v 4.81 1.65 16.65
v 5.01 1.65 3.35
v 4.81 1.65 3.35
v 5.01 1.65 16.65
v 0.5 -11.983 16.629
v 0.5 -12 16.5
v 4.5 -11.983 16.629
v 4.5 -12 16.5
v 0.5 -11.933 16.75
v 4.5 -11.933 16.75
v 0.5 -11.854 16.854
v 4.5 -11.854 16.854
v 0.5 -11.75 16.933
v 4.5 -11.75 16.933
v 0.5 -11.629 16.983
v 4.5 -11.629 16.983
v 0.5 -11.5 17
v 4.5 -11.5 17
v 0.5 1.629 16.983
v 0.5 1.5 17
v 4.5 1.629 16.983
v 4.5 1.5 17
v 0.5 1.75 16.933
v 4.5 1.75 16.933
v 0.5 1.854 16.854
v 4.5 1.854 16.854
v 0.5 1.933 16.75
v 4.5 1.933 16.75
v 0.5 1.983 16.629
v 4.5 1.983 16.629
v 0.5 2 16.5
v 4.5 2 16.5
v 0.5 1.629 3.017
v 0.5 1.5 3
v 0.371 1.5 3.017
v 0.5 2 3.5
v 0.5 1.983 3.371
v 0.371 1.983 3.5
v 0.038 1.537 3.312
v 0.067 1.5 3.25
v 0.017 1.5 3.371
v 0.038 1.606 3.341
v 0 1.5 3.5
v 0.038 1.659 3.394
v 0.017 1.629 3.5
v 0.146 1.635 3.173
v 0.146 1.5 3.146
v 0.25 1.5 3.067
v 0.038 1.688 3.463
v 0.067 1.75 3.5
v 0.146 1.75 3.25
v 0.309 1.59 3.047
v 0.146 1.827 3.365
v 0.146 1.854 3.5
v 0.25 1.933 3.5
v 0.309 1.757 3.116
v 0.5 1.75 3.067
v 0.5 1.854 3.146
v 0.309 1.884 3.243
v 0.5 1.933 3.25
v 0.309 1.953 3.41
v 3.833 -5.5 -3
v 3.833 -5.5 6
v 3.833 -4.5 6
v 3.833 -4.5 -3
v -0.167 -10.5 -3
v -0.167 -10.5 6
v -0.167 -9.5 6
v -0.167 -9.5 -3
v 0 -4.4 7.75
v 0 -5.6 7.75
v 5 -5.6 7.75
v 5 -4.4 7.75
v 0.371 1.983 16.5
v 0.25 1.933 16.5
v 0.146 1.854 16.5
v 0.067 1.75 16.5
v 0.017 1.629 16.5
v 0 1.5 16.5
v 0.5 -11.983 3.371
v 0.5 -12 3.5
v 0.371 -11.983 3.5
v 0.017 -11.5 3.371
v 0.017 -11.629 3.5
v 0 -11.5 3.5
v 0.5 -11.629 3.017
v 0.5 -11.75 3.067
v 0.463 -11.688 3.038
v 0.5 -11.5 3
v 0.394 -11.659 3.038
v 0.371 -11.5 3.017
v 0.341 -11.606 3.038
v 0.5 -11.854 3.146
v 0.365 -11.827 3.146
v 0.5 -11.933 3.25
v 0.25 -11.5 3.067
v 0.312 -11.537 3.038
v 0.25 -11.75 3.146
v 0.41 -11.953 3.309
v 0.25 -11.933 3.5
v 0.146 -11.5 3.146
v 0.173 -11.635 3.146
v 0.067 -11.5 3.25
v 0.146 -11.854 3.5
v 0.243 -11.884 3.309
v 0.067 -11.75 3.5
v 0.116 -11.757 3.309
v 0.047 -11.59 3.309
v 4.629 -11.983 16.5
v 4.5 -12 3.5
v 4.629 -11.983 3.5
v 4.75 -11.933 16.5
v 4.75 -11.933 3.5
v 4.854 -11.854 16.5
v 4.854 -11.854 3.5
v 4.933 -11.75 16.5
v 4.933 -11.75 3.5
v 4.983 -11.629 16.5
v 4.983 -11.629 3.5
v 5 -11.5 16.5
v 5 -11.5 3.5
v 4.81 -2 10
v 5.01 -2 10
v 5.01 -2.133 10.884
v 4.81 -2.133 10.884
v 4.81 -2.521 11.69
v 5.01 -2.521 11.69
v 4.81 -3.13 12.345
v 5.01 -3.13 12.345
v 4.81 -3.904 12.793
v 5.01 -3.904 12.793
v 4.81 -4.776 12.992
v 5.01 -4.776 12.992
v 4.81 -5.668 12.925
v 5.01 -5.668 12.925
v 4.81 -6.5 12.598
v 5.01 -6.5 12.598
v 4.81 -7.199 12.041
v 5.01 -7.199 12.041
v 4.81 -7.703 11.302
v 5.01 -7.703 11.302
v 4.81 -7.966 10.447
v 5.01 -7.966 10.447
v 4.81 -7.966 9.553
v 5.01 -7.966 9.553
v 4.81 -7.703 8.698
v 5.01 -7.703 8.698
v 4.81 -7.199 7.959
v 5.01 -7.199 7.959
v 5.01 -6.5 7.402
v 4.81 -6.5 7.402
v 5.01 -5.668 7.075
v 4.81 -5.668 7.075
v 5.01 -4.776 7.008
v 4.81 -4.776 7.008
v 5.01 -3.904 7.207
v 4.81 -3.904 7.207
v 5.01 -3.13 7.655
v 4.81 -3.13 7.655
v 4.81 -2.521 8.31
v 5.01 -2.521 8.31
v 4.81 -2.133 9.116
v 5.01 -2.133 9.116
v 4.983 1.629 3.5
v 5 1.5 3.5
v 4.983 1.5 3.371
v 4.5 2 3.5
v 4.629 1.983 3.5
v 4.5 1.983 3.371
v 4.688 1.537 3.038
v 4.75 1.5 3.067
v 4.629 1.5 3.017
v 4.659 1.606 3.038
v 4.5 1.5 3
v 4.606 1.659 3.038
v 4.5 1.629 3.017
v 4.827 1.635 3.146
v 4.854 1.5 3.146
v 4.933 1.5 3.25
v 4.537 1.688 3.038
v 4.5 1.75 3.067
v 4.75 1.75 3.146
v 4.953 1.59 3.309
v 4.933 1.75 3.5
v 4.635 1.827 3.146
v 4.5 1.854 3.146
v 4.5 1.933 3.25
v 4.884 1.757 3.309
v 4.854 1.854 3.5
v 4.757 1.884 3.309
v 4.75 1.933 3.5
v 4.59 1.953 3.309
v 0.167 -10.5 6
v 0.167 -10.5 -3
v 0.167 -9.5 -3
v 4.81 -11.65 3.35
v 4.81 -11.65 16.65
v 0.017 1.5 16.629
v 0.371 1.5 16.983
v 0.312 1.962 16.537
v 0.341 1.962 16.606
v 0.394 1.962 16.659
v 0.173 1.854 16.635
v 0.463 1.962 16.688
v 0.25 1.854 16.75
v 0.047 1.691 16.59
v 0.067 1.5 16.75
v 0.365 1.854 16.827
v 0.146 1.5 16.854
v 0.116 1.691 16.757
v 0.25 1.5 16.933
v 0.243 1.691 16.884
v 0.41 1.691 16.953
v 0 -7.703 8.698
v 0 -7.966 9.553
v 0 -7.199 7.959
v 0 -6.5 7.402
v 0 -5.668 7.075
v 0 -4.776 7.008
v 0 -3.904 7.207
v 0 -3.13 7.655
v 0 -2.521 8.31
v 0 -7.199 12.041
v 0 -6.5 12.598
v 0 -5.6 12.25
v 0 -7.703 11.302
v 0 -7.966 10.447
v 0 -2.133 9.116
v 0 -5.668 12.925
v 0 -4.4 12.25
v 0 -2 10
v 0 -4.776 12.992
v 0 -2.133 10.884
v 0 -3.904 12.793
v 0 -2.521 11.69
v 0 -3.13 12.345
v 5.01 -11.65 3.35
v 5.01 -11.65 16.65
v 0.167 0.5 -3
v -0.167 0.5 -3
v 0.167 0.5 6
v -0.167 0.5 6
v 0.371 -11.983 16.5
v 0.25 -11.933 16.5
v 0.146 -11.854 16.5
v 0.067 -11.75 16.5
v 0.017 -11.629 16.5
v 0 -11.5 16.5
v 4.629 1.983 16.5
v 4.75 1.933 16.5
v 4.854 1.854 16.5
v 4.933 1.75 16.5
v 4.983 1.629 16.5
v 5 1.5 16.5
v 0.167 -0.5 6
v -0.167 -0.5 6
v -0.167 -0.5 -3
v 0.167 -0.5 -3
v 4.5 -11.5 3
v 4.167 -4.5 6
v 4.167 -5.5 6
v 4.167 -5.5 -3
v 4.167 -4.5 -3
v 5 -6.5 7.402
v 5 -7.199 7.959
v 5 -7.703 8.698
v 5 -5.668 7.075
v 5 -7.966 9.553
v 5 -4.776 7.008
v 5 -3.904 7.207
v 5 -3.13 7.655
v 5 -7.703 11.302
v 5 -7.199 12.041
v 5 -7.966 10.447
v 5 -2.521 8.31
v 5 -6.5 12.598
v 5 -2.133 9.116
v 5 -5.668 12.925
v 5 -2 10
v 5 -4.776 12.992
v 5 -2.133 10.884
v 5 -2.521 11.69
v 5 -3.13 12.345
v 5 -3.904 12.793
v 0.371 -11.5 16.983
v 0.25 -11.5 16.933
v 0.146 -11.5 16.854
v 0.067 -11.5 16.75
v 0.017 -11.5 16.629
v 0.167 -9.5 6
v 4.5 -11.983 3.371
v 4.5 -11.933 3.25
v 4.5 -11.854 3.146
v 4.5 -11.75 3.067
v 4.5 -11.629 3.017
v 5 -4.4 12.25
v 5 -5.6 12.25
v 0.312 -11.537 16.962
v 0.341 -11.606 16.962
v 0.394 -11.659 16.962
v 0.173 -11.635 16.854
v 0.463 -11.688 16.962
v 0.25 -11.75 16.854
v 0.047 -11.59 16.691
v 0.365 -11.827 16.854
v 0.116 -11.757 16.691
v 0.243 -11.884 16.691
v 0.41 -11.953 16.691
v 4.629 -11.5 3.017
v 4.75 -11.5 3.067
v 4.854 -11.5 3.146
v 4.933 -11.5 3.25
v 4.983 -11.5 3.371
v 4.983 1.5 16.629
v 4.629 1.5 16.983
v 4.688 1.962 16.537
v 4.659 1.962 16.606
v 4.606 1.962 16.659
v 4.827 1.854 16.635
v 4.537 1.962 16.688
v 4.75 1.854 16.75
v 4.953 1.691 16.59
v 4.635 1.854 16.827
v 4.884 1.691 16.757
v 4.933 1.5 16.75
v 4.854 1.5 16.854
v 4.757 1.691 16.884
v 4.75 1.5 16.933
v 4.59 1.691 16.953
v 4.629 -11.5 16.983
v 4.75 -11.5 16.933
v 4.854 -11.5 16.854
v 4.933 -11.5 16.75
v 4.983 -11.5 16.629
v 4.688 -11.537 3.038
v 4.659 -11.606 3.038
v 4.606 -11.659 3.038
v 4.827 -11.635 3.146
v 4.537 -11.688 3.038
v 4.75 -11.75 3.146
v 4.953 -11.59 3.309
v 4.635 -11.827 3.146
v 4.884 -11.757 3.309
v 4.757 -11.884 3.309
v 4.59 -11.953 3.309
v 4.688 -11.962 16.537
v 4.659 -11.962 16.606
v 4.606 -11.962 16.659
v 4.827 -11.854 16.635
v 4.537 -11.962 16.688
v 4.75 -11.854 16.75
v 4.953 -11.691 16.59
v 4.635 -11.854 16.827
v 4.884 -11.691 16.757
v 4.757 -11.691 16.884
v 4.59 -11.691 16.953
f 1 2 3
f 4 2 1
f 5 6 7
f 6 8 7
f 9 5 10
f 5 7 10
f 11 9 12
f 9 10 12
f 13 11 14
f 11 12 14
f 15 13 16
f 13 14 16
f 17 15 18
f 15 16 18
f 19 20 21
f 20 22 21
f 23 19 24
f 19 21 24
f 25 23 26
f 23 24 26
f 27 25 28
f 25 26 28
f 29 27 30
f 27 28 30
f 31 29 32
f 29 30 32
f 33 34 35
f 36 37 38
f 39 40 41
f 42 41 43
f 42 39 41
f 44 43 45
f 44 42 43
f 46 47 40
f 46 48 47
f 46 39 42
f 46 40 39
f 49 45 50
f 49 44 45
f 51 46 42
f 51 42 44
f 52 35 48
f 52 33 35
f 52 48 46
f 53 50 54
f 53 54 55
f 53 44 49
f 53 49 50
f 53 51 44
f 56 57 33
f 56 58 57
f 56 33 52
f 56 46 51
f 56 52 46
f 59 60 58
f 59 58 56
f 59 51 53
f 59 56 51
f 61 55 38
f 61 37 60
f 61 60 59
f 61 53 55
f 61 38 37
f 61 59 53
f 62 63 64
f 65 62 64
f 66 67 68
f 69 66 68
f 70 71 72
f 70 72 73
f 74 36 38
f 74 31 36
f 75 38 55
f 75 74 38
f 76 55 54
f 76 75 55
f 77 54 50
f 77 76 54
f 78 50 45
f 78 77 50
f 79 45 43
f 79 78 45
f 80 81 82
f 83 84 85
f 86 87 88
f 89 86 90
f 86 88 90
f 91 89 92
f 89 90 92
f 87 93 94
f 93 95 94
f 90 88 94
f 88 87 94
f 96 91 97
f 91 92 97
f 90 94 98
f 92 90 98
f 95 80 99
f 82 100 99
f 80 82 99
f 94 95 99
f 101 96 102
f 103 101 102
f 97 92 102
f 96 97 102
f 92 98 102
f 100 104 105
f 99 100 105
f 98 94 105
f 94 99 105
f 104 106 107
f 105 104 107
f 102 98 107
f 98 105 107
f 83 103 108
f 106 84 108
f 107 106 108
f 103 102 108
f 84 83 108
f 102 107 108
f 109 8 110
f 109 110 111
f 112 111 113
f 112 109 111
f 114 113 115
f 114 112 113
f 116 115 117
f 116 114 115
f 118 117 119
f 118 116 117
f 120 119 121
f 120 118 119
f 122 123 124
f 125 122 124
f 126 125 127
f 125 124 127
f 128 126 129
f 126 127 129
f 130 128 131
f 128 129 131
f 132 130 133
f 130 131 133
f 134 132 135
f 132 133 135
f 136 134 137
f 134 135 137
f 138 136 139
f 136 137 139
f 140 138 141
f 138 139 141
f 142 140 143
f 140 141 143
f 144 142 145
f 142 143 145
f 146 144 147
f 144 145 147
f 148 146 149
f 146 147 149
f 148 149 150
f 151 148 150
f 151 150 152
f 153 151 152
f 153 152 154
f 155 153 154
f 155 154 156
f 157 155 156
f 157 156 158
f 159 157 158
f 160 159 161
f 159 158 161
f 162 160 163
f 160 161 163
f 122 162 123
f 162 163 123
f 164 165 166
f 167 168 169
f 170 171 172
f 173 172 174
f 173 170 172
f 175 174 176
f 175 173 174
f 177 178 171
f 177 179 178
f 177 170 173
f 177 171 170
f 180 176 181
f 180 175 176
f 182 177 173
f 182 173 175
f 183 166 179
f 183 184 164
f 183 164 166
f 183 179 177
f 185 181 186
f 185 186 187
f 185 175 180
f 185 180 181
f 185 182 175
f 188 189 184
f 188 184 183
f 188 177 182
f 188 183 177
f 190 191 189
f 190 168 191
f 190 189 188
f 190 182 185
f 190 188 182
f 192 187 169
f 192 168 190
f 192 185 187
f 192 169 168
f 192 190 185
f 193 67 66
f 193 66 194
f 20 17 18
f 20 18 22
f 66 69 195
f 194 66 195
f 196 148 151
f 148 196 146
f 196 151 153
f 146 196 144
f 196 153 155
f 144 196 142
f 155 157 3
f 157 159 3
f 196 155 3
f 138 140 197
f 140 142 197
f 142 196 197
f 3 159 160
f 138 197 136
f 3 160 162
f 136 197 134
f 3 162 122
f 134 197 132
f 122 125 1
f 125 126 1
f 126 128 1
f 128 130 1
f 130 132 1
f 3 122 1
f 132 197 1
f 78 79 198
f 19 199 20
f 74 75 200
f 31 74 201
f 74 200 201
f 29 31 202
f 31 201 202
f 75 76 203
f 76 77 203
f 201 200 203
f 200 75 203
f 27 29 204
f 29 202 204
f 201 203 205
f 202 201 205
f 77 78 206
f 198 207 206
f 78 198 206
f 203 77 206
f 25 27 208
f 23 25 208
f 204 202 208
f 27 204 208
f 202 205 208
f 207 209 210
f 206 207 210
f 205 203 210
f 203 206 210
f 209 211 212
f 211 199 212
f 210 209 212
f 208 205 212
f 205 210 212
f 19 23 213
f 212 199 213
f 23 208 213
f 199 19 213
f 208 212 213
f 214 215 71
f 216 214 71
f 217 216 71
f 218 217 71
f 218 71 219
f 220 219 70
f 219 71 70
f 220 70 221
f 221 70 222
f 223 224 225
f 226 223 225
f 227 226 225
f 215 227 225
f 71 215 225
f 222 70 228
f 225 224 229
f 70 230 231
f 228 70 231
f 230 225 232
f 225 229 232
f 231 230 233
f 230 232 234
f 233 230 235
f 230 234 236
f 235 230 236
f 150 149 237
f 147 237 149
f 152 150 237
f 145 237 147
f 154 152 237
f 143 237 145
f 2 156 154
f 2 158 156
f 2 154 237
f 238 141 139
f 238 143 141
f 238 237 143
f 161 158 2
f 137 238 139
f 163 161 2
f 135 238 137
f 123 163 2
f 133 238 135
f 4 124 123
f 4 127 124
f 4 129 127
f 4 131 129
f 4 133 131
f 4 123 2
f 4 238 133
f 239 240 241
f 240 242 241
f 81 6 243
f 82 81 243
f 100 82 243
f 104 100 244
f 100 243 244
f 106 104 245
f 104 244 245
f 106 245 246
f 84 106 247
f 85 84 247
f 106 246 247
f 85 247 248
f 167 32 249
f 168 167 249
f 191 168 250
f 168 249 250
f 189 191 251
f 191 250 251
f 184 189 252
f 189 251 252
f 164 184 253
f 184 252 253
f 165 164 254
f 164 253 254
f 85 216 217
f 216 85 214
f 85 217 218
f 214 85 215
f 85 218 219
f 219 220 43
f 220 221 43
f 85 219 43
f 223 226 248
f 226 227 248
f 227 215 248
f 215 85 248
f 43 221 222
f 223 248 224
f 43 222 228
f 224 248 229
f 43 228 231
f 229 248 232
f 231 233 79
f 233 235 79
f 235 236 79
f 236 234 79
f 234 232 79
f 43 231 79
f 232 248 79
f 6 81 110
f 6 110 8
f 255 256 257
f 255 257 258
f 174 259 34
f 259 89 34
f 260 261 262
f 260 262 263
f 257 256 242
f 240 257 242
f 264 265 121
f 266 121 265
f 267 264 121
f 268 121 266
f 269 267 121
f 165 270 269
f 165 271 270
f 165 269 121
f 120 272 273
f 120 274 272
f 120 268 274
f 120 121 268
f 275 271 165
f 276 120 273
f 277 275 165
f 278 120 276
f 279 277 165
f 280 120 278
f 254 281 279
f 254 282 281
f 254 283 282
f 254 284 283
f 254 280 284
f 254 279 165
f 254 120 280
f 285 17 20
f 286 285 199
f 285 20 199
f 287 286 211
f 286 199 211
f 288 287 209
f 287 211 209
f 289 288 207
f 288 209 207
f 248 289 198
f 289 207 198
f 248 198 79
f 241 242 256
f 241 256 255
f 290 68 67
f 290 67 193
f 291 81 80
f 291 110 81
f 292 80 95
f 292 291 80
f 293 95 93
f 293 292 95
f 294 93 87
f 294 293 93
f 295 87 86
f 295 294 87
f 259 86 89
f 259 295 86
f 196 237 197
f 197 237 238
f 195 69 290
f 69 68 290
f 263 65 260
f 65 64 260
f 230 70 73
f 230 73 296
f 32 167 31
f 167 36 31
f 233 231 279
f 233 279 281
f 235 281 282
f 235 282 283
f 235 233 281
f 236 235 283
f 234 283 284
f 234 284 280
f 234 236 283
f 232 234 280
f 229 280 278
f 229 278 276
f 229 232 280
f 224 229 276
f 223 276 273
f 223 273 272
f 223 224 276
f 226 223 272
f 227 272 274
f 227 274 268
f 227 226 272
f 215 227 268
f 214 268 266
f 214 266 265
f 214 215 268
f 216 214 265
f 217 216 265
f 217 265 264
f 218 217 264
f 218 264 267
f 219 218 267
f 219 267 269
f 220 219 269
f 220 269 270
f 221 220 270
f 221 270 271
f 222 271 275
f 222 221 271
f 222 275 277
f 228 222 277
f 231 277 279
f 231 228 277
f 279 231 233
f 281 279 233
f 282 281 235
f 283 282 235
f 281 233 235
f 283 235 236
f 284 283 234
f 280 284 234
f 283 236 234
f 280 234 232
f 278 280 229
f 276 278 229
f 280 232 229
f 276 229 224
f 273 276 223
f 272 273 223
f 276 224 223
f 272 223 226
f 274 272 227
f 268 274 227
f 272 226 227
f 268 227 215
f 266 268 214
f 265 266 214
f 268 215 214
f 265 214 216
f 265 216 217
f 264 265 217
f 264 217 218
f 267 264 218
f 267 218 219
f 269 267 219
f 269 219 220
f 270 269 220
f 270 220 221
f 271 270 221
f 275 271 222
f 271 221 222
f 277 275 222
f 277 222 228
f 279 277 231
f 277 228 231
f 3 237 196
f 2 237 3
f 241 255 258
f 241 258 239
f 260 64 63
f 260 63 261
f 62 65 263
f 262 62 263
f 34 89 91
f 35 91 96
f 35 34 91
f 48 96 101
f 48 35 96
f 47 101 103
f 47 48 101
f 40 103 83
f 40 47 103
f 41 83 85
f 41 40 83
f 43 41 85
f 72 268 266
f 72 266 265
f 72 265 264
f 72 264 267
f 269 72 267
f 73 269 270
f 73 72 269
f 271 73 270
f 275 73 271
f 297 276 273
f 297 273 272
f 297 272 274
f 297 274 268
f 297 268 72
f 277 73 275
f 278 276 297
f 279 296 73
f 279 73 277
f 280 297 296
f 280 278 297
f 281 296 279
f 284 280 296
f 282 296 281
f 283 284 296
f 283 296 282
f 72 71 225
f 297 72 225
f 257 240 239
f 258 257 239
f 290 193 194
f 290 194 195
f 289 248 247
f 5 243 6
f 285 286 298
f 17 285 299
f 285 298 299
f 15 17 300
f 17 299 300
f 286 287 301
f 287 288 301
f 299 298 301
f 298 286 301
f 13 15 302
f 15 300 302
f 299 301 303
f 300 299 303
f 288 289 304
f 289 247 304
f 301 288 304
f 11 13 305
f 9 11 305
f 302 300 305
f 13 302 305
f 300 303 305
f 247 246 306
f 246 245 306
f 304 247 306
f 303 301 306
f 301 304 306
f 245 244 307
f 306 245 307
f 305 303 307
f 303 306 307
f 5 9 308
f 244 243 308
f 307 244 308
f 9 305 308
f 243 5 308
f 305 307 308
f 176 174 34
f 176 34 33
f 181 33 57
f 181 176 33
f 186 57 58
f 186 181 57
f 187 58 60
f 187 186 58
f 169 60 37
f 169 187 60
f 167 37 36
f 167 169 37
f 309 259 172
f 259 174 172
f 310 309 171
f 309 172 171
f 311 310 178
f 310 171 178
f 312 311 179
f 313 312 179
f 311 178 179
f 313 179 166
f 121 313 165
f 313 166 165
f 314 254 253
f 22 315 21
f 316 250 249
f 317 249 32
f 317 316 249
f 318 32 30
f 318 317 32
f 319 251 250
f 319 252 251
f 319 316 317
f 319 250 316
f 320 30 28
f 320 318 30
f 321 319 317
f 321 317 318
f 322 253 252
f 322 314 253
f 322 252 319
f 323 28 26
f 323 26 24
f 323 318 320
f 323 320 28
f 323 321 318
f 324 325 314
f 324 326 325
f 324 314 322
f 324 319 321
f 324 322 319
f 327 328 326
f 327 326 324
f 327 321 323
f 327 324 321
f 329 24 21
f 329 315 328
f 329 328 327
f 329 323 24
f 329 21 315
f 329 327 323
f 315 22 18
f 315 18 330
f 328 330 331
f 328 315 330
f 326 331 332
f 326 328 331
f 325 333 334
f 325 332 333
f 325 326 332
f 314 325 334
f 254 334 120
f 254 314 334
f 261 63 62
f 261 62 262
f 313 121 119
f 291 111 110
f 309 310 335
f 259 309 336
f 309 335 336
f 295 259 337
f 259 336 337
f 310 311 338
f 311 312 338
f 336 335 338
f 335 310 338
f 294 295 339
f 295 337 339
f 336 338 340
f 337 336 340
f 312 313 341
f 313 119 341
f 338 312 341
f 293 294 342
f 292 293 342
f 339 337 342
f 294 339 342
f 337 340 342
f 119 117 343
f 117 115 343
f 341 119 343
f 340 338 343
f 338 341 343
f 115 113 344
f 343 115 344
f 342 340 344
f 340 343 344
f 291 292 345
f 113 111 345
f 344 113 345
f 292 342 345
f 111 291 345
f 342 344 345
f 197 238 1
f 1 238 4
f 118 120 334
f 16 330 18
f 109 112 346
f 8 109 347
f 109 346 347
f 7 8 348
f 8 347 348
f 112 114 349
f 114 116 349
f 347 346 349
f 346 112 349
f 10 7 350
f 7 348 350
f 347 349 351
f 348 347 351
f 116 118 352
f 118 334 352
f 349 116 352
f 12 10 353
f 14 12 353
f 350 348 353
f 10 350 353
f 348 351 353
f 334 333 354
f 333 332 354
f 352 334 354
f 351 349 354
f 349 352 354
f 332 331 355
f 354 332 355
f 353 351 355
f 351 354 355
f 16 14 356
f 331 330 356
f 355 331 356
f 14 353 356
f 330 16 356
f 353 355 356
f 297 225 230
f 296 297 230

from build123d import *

# Parameters (mm, degrees)
SKETCH001_R       = 3
SKETCH001_W       = 1.2
SKETCH001_H       = 4.5
PAD001_DEPTH      = 5
SKETCH003_W       = 0.333334
SKETCH003_H       = 1
PAD002_DEPTH      = 6
PAD002_DEPTH_BACK = 3
SKETCH004_W       = 13.3
SKETCH004_H       = 13.3
SKETCH004_R       = 3
PAD003_DEPTH      = 0.2
SKETCH_W          = 14
SKETCH_H          = 14
SKETCH_R          = 3
PAD_DEPTH         = 5
FILLET_R          = 0.5


with BuildPart() as pad001:
    # Sketch001 → Pad001 (new body)
    with BuildSketch(Plane.YZ):
        with Locations((-5, 10)):
            Circle(SKETCH001_R)
        with Locations((-5, 10)):
            Rectangle(SKETCH001_W, SKETCH001_H, mode=Mode.SUBTRACT)
    extrude(amount=PAD001_DEPTH)


with BuildPart() as pad002:
    # Sketch003 → Pad002 (new body, two sides)
    with BuildSketch(Plane.XY) as pad002_sk:
        Rectangle(SKETCH003_W, SKETCH003_H)
        with Locations((4, -5)):
            Rectangle(SKETCH003_W, SKETCH003_H)
        with Locations((0, -10)):
            Rectangle(SKETCH003_W, SKETCH003_H)
    extrude(amount=PAD002_DEPTH)
    extrude(pad002_sk.sketch, amount=-PAD002_DEPTH_BACK)


with BuildPart() as pad003:
    # Sketch004 → Pad003 (new body)
    with BuildSketch(Plane.YZ.offset(5.01)):
        with Locations((-5, 10)):
            Rectangle(SKETCH004_W, SKETCH004_H)
        with Locations((-5, 10)):
            Circle(SKETCH004_R, mode=Mode.SUBTRACT)
    extrude(amount=-PAD003_DEPTH)


with BuildPart() as fillet_body:
    # Sketch → Pad (new body)
    with BuildSketch(Plane.YZ):
        with Locations((-5, 10)):
            Rectangle(SKETCH_W, SKETCH_H)
        with Locations((-5, 10)):
            Circle(SKETCH_R, mode=Mode.SUBTRACT)
    extrude(amount=PAD_DEPTH)

    # Fillet
    fillet_edges = [fillet_body.edges().sort_by_distance(p)[0] for p in [
        (0, -12, 10),
        (0, -5, 17),
        (5, -5, 17),
        (5, -12, 10),
        (5, 2, 10),
        (5, -5, 3),
        (2.5, -12, 17),
        (2.5, -12, 3),
        (2.5, 2, 3),
        (0, -5, 3),
        (0, 2, 10),
        (2.5, 2, 17),
    ]]
    fillet(fillet_edges, radius=FILLET_R)


solid = Compound([pad001.part, pad002.part, pad003.part, fillet_body.part])
